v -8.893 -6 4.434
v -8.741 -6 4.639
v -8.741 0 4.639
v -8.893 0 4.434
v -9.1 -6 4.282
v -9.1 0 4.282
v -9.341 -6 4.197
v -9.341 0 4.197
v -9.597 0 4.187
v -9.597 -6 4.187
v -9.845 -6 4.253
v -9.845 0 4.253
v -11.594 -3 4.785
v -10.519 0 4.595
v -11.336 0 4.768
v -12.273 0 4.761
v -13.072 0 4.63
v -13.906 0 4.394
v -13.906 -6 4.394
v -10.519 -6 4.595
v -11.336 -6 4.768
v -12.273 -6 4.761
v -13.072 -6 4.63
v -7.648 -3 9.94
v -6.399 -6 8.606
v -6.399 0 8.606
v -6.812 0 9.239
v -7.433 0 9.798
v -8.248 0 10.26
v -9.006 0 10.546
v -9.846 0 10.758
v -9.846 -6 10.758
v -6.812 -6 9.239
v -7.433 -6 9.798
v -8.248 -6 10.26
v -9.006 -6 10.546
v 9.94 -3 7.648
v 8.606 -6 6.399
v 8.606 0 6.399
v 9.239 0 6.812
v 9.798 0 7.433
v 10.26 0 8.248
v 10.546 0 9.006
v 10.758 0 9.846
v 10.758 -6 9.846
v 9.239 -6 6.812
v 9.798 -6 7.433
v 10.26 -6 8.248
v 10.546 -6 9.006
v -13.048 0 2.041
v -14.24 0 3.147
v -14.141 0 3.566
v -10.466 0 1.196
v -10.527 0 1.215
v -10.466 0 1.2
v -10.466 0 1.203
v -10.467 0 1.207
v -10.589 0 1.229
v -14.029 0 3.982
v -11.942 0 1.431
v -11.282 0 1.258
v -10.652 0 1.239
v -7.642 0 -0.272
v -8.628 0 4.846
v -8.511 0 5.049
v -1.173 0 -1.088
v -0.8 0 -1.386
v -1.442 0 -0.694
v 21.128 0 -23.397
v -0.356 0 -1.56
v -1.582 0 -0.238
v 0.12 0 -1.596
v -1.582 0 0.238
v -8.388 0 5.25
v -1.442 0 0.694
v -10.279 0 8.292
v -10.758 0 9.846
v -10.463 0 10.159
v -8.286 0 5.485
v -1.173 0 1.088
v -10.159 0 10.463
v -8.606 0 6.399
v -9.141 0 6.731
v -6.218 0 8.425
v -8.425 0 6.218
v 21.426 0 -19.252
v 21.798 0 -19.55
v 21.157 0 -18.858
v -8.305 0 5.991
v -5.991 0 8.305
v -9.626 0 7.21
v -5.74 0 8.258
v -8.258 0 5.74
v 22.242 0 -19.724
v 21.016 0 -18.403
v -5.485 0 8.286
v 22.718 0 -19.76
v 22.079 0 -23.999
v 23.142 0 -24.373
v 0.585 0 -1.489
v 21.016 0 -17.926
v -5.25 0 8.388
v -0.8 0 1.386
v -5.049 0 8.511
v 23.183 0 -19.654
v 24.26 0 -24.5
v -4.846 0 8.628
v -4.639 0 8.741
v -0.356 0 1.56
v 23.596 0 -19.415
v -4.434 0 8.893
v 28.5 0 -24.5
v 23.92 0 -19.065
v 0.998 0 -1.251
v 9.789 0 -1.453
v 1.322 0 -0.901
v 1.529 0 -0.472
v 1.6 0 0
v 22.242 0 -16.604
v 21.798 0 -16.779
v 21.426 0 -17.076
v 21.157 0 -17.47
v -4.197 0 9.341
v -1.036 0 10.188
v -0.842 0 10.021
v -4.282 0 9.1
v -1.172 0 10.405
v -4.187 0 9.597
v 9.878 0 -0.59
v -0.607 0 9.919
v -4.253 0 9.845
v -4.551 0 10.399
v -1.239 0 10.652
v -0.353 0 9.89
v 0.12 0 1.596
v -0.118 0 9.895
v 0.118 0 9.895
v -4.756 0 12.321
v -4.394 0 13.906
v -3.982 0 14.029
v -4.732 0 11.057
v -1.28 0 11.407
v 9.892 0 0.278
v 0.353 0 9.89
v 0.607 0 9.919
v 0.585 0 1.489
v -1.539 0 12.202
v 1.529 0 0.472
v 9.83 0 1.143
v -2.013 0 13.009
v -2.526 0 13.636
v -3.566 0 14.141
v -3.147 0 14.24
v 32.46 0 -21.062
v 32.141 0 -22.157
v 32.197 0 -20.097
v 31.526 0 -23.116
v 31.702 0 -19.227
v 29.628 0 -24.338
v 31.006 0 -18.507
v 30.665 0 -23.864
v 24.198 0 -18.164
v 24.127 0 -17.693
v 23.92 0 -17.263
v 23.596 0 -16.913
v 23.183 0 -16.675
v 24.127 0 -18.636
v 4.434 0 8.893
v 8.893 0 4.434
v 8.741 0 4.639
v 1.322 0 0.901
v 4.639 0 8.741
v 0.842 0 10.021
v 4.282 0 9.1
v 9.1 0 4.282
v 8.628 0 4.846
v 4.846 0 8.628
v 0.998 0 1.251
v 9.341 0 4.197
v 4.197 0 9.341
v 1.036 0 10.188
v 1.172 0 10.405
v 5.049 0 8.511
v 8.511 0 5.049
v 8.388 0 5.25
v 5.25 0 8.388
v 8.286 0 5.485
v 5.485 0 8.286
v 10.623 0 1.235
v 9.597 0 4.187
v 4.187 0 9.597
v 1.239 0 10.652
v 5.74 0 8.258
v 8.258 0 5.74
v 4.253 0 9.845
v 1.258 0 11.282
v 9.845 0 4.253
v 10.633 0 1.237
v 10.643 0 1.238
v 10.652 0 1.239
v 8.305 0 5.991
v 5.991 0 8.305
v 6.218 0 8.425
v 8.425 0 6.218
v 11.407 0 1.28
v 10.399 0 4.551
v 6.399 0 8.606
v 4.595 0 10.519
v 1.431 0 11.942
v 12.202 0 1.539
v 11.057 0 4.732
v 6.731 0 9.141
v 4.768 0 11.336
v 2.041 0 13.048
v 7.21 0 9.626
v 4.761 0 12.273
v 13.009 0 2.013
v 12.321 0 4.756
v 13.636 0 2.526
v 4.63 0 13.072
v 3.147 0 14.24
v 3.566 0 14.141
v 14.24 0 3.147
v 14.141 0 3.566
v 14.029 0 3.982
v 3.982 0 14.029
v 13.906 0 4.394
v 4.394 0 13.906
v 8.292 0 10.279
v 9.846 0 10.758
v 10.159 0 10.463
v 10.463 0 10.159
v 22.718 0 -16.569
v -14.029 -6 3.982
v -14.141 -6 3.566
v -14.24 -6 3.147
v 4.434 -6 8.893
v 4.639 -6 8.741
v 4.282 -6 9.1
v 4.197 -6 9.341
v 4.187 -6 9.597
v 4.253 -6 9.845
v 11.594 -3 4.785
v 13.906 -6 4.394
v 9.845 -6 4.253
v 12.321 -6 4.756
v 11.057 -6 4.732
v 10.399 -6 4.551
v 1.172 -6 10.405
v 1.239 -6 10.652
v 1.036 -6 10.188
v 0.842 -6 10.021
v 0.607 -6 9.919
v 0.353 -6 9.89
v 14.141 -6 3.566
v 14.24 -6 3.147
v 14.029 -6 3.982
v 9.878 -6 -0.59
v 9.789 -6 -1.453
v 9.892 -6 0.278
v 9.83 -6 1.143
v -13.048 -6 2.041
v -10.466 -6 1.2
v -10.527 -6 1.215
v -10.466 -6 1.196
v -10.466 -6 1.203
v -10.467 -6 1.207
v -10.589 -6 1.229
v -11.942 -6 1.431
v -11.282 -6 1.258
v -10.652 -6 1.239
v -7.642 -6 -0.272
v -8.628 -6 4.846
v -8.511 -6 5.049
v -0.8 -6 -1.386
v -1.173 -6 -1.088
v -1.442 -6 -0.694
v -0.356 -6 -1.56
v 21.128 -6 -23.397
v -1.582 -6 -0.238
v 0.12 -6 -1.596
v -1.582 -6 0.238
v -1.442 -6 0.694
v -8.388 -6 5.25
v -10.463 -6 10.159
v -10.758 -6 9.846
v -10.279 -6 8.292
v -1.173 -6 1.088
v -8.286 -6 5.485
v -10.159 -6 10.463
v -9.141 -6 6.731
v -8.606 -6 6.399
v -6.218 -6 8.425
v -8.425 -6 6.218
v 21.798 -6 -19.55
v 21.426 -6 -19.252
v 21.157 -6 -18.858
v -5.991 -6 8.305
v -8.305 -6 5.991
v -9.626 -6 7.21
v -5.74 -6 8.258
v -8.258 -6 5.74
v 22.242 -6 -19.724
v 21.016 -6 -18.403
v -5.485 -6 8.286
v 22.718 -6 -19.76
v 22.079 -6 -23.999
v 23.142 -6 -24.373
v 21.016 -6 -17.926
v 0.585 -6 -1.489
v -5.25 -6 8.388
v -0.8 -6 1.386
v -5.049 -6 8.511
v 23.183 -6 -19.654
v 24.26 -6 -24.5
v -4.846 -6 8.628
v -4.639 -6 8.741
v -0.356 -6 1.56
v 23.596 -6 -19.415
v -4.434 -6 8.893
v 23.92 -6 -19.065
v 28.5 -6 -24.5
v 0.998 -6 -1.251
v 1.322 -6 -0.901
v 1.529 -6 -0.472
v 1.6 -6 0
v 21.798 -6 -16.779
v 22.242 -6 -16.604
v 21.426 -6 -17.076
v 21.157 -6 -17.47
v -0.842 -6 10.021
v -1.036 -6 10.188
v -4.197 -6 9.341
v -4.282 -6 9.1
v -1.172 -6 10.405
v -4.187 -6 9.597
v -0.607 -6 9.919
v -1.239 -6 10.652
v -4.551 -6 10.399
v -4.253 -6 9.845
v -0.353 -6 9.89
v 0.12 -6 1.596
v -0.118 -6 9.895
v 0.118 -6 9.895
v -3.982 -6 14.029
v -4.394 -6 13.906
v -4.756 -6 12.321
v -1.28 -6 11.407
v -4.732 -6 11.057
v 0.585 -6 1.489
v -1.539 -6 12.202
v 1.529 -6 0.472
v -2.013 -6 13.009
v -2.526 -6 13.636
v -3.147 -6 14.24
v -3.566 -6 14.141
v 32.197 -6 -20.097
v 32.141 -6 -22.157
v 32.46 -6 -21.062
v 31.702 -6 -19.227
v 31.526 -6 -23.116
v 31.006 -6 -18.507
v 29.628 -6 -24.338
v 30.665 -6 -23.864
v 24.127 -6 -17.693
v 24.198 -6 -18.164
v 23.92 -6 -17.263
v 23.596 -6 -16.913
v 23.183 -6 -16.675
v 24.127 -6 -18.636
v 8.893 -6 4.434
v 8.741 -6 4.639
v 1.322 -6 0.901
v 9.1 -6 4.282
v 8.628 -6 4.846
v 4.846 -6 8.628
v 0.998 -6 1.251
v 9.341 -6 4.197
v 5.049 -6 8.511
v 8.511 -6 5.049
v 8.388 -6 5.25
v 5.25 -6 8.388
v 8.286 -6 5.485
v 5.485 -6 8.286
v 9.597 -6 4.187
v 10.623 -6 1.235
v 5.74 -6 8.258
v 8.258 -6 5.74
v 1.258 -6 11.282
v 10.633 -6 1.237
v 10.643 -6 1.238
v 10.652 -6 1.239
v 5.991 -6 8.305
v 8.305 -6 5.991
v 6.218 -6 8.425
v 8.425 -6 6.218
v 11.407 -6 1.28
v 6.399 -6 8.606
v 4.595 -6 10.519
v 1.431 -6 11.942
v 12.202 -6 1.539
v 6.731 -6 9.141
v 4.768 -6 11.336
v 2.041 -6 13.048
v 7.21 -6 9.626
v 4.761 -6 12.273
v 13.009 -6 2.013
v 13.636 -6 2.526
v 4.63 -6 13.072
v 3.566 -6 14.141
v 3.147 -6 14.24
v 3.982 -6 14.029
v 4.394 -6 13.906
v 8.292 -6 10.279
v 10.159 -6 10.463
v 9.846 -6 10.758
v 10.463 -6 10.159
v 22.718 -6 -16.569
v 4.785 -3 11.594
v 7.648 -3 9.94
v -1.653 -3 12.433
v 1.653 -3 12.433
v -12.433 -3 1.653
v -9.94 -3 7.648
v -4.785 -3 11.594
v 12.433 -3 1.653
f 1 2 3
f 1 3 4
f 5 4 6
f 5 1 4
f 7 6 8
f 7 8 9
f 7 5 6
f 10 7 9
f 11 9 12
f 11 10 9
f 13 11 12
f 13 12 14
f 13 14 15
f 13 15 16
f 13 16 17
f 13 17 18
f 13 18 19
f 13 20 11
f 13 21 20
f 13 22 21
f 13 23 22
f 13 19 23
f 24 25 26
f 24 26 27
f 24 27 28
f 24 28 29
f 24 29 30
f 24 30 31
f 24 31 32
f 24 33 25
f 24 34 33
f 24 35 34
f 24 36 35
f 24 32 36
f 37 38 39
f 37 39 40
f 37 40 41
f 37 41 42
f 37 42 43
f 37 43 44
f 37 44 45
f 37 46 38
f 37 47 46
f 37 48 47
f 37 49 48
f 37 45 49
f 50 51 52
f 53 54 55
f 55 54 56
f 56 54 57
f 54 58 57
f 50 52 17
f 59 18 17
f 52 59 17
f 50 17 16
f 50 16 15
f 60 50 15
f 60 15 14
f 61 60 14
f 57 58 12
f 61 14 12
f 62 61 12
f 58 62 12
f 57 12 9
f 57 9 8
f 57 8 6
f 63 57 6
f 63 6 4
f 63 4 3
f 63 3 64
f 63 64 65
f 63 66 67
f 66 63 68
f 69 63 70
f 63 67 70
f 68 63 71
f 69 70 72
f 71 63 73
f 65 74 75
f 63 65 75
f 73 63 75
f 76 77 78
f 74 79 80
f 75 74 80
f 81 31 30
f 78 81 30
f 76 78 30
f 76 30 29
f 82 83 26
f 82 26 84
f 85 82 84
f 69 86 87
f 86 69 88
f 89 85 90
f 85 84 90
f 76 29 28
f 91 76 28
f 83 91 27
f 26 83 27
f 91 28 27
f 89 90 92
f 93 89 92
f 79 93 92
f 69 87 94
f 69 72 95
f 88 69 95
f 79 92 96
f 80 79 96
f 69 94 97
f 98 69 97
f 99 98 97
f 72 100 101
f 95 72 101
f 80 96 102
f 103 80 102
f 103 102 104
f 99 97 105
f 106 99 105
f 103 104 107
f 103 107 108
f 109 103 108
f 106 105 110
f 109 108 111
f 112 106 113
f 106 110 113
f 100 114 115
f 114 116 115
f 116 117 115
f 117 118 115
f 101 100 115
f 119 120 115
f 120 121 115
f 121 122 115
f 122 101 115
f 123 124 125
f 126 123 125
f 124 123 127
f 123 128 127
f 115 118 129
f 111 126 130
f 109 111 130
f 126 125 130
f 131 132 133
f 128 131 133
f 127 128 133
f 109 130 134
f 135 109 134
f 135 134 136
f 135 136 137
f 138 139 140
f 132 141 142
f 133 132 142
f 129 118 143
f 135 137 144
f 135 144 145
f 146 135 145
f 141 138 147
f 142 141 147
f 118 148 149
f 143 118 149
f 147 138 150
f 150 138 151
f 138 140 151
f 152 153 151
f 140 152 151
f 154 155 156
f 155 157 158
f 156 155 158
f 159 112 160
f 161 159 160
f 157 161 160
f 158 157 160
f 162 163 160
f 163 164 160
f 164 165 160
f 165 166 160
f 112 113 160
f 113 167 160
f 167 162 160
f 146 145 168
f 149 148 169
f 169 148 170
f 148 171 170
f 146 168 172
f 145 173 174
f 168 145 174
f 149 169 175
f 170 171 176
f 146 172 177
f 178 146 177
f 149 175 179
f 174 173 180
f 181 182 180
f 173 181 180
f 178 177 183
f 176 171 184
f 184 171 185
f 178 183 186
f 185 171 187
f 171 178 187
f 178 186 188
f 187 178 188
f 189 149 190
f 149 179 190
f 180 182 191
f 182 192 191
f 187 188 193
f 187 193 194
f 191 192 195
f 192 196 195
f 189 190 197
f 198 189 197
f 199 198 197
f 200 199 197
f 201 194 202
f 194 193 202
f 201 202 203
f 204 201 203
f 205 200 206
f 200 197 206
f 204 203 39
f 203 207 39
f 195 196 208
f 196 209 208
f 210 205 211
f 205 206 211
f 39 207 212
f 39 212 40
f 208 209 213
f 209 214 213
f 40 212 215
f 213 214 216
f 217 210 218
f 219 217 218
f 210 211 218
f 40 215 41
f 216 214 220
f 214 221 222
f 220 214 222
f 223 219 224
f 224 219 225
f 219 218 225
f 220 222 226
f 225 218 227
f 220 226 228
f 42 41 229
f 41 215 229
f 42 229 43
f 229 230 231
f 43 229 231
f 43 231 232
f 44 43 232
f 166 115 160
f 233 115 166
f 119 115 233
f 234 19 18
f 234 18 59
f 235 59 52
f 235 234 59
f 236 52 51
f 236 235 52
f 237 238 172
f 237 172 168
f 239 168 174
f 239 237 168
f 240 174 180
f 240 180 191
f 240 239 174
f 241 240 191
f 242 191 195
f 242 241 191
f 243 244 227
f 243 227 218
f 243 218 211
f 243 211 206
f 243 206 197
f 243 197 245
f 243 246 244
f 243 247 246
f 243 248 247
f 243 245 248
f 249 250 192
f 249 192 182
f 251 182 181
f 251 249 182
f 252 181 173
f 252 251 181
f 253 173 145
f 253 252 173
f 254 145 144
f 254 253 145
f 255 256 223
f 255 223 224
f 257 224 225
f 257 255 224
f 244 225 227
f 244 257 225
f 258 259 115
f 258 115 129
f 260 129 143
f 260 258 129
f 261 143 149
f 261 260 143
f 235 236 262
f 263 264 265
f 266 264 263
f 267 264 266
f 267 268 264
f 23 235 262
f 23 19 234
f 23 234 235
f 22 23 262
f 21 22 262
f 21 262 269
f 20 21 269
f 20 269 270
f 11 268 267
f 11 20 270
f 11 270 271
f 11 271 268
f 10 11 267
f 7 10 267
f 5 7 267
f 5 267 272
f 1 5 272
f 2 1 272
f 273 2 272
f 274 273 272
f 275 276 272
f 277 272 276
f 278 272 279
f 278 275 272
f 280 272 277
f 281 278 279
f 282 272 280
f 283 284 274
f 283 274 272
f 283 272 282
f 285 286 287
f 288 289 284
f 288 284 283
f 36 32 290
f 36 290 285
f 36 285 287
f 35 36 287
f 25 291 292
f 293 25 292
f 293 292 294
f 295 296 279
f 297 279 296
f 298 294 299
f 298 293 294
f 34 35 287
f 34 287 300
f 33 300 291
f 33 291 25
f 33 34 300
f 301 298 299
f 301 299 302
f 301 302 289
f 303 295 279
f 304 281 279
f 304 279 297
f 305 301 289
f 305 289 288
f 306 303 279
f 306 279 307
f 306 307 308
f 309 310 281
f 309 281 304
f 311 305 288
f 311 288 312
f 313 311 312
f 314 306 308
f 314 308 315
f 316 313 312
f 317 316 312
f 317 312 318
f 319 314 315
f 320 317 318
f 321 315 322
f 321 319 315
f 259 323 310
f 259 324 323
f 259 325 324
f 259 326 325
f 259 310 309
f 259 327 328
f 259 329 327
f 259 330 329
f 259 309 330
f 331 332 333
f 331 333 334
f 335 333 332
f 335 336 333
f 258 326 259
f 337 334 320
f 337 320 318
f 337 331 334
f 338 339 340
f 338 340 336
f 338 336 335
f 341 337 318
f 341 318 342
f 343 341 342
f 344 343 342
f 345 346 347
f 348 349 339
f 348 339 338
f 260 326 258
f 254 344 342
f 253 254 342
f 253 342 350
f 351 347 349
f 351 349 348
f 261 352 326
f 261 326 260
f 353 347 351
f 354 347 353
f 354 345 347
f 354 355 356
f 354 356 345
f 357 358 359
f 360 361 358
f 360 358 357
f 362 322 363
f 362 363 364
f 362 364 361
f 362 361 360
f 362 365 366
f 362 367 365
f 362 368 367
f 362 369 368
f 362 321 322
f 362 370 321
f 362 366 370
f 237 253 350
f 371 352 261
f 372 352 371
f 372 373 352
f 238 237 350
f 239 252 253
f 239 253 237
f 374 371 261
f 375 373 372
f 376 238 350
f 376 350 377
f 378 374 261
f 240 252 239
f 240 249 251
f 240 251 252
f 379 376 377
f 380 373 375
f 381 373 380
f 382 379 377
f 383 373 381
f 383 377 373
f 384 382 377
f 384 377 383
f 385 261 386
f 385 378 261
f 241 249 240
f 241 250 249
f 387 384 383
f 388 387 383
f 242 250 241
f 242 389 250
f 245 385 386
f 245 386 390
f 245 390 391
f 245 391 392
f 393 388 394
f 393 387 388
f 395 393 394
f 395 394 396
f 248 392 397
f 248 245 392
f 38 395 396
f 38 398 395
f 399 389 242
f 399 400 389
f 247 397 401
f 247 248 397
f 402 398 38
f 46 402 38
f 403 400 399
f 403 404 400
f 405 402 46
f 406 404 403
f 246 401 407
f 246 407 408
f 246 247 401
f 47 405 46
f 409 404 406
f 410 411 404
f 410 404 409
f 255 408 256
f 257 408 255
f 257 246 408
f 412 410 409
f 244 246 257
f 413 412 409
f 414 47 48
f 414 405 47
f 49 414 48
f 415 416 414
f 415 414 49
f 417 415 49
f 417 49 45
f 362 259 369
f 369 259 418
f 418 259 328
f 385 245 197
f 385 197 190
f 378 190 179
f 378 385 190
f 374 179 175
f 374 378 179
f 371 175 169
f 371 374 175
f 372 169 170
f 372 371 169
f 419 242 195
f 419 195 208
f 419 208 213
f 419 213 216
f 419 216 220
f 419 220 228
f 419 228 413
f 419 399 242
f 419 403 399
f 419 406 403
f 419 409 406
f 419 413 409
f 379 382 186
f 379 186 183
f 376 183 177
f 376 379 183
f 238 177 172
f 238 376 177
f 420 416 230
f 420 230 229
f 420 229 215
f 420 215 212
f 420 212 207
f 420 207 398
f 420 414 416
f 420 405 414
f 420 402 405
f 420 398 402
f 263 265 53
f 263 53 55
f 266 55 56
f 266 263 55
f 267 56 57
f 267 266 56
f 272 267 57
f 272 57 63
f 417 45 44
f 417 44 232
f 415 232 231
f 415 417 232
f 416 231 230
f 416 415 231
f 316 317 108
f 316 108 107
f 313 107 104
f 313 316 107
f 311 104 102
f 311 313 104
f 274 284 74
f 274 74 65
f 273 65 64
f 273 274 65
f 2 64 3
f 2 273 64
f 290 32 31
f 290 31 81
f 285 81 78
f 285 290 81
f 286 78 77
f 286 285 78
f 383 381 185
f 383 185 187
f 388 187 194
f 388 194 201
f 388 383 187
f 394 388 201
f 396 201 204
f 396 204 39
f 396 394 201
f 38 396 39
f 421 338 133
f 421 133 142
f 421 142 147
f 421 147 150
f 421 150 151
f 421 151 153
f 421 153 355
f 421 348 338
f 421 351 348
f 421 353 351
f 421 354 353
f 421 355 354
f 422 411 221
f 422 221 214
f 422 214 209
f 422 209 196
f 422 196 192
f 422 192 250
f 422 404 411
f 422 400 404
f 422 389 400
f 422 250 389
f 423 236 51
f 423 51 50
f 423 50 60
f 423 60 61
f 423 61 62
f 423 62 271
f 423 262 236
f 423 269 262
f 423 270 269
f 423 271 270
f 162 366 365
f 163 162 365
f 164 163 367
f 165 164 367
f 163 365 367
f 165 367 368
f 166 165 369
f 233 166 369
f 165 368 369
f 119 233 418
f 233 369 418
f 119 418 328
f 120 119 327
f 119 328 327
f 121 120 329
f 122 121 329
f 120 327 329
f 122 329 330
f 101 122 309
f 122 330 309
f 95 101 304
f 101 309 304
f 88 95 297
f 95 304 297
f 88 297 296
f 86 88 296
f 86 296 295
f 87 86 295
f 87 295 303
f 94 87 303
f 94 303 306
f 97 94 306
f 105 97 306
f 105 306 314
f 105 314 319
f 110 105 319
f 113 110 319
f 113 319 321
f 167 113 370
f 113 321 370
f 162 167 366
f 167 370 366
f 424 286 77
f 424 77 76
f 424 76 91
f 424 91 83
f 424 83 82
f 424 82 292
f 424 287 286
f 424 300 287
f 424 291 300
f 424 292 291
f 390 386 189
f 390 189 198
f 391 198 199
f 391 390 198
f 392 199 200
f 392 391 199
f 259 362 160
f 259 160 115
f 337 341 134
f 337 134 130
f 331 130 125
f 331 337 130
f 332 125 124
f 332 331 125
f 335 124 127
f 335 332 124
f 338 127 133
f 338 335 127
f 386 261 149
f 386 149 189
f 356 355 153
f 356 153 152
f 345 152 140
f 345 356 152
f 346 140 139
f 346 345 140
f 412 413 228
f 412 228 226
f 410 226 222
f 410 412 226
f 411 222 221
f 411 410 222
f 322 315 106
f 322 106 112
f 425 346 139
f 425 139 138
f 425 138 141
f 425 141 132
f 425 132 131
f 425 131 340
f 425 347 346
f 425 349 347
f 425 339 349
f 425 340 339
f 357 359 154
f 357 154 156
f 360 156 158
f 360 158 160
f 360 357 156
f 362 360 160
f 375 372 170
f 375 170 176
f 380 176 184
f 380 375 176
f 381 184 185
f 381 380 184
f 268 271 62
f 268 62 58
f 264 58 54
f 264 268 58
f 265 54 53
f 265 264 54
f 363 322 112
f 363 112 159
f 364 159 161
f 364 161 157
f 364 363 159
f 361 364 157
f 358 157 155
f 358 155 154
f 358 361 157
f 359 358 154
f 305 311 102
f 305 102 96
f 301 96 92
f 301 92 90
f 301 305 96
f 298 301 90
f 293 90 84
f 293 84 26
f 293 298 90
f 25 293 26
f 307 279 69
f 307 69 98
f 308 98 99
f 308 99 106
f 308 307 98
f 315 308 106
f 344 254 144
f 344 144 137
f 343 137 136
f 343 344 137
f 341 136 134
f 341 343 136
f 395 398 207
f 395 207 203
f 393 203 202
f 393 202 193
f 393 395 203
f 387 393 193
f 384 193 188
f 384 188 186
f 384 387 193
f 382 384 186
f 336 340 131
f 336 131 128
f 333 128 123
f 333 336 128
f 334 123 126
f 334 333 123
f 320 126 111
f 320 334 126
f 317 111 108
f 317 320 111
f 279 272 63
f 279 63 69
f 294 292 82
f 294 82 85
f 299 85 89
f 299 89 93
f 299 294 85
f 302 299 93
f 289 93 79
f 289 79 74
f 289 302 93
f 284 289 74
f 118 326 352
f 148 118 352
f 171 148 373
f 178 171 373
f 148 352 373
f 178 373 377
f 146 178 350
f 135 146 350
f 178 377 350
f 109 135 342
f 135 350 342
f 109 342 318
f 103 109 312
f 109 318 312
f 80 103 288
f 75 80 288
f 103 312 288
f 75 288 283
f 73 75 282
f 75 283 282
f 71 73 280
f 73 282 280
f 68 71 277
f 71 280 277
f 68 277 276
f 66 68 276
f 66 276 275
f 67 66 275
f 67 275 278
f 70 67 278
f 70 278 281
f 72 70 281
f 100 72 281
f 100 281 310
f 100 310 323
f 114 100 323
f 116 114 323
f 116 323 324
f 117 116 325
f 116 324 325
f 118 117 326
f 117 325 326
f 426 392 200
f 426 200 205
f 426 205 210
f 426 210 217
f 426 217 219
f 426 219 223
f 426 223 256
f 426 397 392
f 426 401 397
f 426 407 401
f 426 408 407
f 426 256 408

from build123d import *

# Parameters (mm, degrees)
ESBO_O1_R                = 1.6
RESSALTO_EXTRUS_O1_DEPTH = 6


with BuildPart() as part:
    # Esboço1 → Ressalto-extrusão1 (new body)
    with BuildSketch(Plane.XZ.offset(6)):
        with BuildLine():
            Line((24.26036734, -24.5), (28.5, -24.5))
            ThreePointArc((28.5, -24.5), (31.122071197, -23.520718894), (32.460270003, -21.062371319))
            ThreePointArc((32.460270003, -21.062371319), (31.976417823, -19.646228266), (31.005959689, -18.507024557))
            Line((31.005959689, -18.507024557), (9.788591406, -1.452926582))
            ThreePointArc((9.788591406, -1.452926582), (9.894598333, -0.1563368), (9.829606895, 1.142954792))
            Line((9.829606895, 1.142954792), (10.623194285, 1.235230559))
            ThreePointArc((10.623194285, 1.235230559), (10.637816884, 1.237287137), (10.652472585, 1.239092776))
            add(Edge.make_bspline(
                [(10.652472585, 1.239092776), (12.4185109, 1.078975114), (14.239640851, 3.147417918)],
                knots=[0.078549619, 0.078549619, 0.078549619, 0.770539159, 0.770539159, 0.770539159], degree=2, weights=[1, 0.940738559, 1]))
            ThreePointArc((14.239640851, 3.147417918), (14.0864183, 3.774444408), (13.905599677, 4.394076552))
            add(Edge.make_bspline(
                [(13.905599677, 4.394076552), (11.294233474, 5.274835591), (9.84485826, 4.253150471)],
                knots=[5.512646149, 5.512646149, 5.512646149, 6.204635688, 6.204635688, 6.204635688], degree=2, weights=[1, 0.940738559, 1]))
            ThreePointArc((9.84485826, 4.253150471), (9.217248741, 4.230244905), (8.740864349, 4.639483569))
            ThreePointArc((8.740864349, 4.639483569), (8.570043058, 4.947916667), (8.388342806, 5.250068793))
            ThreePointArc((8.388342806, 5.250068793), (8.272123923, 5.86724911), (8.605765484, 6.399322114))
            add(Edge.make_bspline(
                [(8.605765484, 6.399322114), (10.21525836, 7.143675309), (10.758181759, 9.845564299)],
                knots=[0.078549619, 0.078549619, 0.078549619, 0.770539159, 0.770539159, 0.770539159], degree=2, weights=[1, 0.940738559, 1]))
            ThreePointArc((10.758181759, 9.845564299), (10.311973892, 10.311973892), (9.845564299, 10.758181759))
            add(Edge.make_bspline(
                [(9.845564299, 10.758181759), (7.143675309, 10.21525836), (6.399322114, 8.605765484)],
                knots=[2.371053495, 2.371053495, 2.371053495, 3.063043035, 3.063043035, 3.063043035], degree=2, weights=[1, 0.940738559, 1]))
            ThreePointArc((6.399322114, 8.605765484), (5.86724911, 8.272123923), (5.250068793, 8.388342806))
            ThreePointArc((5.250068793, 8.388342806), (4.947916667, 8.570043058), (4.639483569, 8.740864349))
            ThreePointArc((4.639483569, 8.740864349), (4.230244905, 9.217248741), (4.253150471, 9.84485826))
            add(Edge.make_bspline(
                [(4.253150471, 9.84485826), (5.274835591, 11.294233474), (4.394076552, 13.905599677)],
                knots=[0.078549619, 0.078549619, 0.078549619, 0.770539159, 0.770539159, 0.770539159], degree=2, weights=[1, 0.940738559, 1]))
            ThreePointArc((4.394076552, 13.905599677), (3.774444408, 14.0864183), (3.147417918, 14.239640851))
            add(Edge.make_bspline(
                [(3.147417918, 14.239640851), (1.078975114, 12.4185109), (1.239092776, 10.652472585)],
                knots=[2.371053495, 2.371053495, 2.371053495, 3.063043035, 3.063043035, 3.063043035], degree=2, weights=[1, 0.940738559, 1]))
            ThreePointArc((1.239092776, 10.652472585), (0.945124819, 10.097494016), (0.352521544, 9.889552362))
            ThreePointArc((0.352521544, 9.889552362), (0, 9.895833333), (-0.352521544, 9.889552362))
            ThreePointArc((-0.352521544, 9.889552362), (-0.945124819, 10.097494016), (-1.239092776, 10.652472585))
            add(Edge.make_bspline(
                [(-1.239092776, 10.652472585), (-1.078975114, 12.4185109), (-3.147417918, 14.239640851)],
                knots=[0.078549619, 0.078549619, 0.078549619, 0.770539159, 0.770539159, 0.770539159], degree=2, weights=[1, 0.940738559, 1]))
            ThreePointArc((-3.147417918, 14.239640851), (-3.774444408, 14.0864183), (-4.394076552, 13.905599677))
            add(Edge.make_bspline(
                [(-4.394076552, 13.905599677), (-5.274835591, 11.294233474), (-4.253150471, 9.84485826)],
                knots=[2.371053495, 2.371053495, 2.371053495, 3.063043035, 3.063043035, 3.063043035], degree=2, weights=[1, 0.940738559, 1]))
            ThreePointArc((-4.253150471, 9.84485826), (-4.230244905, 9.217248741), (-4.639483569, 8.740864349))
            ThreePointArc((-4.639483569, 8.740864349), (-4.947916667, 8.570043058), (-5.250068793, 8.388342806))
            ThreePointArc((-5.250068793, 8.388342806), (-5.86724911, 8.272123923), (-6.399322114, 8.605765484))
            add(Edge.make_bspline(
                [(-6.399322114, 8.605765484), (-7.143675309, 10.21525836), (-9.845564299, 10.758181759)],
                knots=[0.078549619, 0.078549619, 0.078549619, 0.770539159, 0.770539159, 0.770539159], degree=2, weights=[1, 0.940738559, 1]))
            ThreePointArc((-9.845564299, 10.758181759), (-10.311973892, 10.311973892), (-10.758181759, 9.845564299))
            add(Edge.make_bspline(
                [(-10.758181759, 9.845564299), (-10.21525836, 7.143675309), (-8.605765484, 6.399322114)],
                knots=[2.371053495, 2.371053495, 2.371053495, 3.063043035, 3.063043035, 3.063043035], degree=2, weights=[1, 0.940738559, 1]))
            ThreePointArc((-8.605765484, 6.399322114), (-8.272123923, 5.86724911), (-8.388342806, 5.250068793))
            ThreePointArc((-8.388342806, 5.250068793), (-8.570043058, 4.947916667), (-8.740864349, 4.639483569))
            ThreePointArc((-8.740864349, 4.639483569), (-9.217248741, 4.230244905), (-9.84485826, 4.253150471))
            add(Edge.make_bspline(
                [(-9.84485826, 4.253150471), (-11.294233474, 5.274835591), (-13.905599677, 4.394076552)],
                knots=[3.220142273, 3.220142273, 3.220142273, 3.912131812, 3.912131812, 3.912131812], degree=2, weights=[1, 0.940738559, 1]))
            ThreePointArc((-13.905599677, 4.394076552), (-14.0864183, 3.774444408), (-14.239640851, 3.147417918))
            add(Edge.make_bspline(
                [(-14.239640851, 3.147417918), (-12.4185109, 1.078975114), (-10.652472585, 1.239092776)],
                knots=[2.371053495, 2.371053495, 2.371053495, 3.063043035, 3.063043035, 3.063043035], degree=2, weights=[1, 0.940738559, 1]))
            ThreePointArc((-10.652472585, 1.239092776), (-10.557951639, 1.222896434), (-10.465816504, 1.196294788))
            ThreePointArc((-10.465816504, 1.196294788), (-10.466260875, 1.201681391), (-10.466707243, 1.207067829))
            Line((-10.466707243, 1.207067829), (-7.642065772, -0.272407964))
            Line((-7.642065772, -0.272407964), (21.127917729, -23.397147602))
            ThreePointArc((21.127917729, -23.397147602), (22.599906261, -24.216234622), (24.26036734, -24.5))
        make_face()
        Circle(ESBO_O1_R, mode=Mode.SUBTRACT)
        with Locations((22.598401843, -18.16414524)):
            Circle(ESBO_O1_R, mode=Mode.SUBTRACT)
    extrude(amount=-RESSALTO_EXTRUS_O1_DEPTH)


solid = part.part
